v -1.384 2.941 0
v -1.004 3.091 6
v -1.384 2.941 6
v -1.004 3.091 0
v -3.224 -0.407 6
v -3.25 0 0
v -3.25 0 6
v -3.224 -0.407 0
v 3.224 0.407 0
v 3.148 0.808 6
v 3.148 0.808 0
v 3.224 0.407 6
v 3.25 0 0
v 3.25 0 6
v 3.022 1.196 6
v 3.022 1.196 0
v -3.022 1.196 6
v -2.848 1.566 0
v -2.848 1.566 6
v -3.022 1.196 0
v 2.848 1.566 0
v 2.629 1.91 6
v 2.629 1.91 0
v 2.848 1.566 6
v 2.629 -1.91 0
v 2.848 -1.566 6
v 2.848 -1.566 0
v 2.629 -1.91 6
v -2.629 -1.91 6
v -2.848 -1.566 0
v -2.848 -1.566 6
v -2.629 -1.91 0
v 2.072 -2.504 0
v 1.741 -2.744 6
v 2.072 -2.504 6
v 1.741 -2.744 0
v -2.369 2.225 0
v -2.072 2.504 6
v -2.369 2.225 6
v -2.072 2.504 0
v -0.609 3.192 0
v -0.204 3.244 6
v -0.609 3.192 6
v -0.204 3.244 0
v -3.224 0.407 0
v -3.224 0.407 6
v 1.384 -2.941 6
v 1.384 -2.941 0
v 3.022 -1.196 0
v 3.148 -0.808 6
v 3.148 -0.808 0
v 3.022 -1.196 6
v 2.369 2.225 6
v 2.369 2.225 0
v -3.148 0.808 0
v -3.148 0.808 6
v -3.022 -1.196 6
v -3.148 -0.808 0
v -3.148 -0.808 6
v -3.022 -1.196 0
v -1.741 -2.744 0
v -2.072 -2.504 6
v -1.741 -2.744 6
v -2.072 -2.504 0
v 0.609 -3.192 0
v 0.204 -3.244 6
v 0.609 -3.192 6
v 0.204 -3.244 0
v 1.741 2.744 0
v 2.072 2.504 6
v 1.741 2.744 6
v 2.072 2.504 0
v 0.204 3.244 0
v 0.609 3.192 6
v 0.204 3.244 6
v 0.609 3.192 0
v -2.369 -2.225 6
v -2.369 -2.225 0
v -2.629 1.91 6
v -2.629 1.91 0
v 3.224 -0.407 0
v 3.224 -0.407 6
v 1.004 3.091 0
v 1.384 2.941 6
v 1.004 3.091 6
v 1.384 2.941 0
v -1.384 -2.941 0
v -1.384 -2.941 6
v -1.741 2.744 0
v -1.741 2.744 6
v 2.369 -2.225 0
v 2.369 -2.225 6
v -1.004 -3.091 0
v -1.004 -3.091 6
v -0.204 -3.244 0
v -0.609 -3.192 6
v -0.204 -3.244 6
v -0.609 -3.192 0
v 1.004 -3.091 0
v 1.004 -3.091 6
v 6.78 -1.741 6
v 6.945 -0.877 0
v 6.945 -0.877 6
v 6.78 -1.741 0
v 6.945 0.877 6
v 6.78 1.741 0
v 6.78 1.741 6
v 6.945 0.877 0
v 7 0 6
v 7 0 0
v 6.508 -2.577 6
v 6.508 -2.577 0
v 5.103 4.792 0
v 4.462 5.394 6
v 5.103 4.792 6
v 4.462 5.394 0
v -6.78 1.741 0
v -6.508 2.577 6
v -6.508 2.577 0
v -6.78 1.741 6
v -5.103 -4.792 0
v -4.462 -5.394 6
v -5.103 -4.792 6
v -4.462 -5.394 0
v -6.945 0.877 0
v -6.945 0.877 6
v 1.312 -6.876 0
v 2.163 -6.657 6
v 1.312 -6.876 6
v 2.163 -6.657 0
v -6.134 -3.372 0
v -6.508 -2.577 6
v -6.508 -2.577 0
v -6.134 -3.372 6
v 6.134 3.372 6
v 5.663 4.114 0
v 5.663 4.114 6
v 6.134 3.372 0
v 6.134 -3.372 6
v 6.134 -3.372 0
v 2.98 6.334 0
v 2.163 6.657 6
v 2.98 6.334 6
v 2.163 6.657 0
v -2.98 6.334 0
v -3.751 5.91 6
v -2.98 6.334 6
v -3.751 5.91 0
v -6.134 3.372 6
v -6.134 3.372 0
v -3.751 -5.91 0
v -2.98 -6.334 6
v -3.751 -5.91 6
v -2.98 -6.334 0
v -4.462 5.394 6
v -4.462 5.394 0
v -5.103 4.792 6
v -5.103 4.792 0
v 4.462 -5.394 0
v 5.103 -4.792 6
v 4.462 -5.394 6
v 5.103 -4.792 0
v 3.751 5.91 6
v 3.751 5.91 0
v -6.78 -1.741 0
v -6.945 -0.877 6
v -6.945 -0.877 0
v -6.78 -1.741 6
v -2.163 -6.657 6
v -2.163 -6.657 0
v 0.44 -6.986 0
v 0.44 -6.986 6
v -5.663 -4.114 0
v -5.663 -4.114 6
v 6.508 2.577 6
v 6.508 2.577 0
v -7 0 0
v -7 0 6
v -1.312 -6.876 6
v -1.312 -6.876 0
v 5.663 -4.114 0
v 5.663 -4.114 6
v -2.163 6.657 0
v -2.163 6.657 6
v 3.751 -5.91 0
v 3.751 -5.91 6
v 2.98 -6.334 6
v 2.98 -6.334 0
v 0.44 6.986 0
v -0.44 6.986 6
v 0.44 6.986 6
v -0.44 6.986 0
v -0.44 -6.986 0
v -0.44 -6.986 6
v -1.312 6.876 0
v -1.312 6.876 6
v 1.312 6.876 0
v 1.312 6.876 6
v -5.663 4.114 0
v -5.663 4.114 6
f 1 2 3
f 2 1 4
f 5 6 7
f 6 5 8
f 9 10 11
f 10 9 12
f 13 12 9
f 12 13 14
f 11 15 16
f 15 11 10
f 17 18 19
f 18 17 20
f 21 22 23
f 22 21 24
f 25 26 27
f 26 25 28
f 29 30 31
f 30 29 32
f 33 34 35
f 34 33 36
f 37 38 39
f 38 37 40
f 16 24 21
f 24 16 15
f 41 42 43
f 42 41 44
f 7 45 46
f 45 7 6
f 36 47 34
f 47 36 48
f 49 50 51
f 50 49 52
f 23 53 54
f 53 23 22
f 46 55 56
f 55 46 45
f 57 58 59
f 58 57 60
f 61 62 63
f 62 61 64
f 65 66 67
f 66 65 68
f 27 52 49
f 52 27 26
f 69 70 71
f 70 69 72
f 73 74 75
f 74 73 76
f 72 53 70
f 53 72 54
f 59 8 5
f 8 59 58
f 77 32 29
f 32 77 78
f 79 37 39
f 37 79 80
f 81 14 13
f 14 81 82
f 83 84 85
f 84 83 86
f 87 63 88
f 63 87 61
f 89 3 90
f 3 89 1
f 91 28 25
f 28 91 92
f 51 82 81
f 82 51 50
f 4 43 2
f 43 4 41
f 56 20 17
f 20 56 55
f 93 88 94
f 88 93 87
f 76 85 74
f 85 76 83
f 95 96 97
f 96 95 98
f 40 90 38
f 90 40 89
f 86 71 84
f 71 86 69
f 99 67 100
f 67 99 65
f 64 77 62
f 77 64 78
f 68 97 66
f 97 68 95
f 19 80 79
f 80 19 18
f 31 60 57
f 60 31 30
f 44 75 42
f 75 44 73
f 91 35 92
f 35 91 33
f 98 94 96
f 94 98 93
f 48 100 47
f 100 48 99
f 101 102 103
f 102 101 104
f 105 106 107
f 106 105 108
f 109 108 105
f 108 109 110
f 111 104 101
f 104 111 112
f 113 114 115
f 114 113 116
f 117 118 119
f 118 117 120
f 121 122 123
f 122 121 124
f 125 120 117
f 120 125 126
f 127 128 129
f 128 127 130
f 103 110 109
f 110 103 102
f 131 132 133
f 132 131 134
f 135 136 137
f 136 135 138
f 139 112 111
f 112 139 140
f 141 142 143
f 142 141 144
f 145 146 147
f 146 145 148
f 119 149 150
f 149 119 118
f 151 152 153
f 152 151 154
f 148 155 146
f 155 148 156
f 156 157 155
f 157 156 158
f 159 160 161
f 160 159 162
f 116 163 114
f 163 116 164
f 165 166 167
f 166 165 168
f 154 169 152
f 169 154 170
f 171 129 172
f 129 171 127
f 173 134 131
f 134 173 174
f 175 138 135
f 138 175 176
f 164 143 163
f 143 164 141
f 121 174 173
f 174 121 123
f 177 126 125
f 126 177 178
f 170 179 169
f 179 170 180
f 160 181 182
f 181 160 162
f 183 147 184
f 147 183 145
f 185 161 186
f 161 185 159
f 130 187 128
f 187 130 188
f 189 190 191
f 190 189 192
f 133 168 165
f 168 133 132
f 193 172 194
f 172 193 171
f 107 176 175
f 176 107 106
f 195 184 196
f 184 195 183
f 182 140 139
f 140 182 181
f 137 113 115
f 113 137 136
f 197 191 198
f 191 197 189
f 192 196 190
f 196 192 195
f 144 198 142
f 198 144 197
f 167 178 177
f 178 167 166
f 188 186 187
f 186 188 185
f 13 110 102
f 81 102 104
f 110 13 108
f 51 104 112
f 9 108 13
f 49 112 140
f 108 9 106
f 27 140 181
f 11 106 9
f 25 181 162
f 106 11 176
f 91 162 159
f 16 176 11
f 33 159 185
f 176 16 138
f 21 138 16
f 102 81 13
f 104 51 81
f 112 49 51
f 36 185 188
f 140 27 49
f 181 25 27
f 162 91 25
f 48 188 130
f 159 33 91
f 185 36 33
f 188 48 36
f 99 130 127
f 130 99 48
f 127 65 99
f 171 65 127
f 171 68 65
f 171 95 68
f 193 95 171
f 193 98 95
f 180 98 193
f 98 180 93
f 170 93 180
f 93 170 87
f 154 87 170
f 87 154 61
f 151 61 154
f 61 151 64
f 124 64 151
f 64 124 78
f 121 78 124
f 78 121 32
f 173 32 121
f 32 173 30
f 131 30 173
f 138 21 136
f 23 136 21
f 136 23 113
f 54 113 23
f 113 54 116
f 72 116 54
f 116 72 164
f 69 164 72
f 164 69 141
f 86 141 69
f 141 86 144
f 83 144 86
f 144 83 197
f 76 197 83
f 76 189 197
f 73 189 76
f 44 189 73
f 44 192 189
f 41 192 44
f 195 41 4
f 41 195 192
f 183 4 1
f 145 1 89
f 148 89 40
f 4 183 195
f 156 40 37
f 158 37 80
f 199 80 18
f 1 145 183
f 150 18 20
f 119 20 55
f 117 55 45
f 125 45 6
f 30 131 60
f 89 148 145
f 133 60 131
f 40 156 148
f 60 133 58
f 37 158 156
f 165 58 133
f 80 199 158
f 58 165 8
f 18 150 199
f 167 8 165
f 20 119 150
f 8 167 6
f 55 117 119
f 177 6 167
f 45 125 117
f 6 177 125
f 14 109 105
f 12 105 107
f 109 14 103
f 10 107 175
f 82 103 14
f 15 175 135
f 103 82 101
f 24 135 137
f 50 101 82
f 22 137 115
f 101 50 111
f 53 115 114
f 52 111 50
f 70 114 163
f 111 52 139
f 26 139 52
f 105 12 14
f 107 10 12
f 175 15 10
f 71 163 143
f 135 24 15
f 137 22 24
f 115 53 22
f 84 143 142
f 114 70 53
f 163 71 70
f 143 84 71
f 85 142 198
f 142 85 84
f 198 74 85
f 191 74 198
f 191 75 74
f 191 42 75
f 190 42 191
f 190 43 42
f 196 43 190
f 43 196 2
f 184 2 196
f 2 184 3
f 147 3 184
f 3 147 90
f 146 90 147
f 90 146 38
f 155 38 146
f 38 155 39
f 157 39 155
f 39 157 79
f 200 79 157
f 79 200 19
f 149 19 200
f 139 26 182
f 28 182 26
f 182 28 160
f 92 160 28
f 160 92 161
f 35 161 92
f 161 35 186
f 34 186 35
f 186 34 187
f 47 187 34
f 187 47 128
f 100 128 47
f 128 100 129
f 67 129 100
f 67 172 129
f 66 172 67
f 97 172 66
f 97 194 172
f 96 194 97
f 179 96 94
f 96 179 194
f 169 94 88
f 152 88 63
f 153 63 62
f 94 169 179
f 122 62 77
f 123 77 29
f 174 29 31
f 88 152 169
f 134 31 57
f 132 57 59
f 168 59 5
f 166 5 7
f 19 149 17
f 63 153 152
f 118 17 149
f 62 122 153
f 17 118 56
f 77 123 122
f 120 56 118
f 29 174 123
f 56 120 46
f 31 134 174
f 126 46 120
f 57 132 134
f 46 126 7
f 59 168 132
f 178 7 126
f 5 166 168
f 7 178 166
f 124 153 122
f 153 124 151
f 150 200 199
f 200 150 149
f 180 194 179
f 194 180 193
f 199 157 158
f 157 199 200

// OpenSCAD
$fn = 50;

difference() {
	union() {
		cylinder(h = 6, r = 7.0);
	}
	union() {
		translate(v = [0.0, 0.0, -100.0]) {
			cylinder(h = 200, r = 3.25);
		}
		translate(v = [0.0, 0.0, -100.0]) {
			cylinder(h = 200, r = 1.8);
		}
		cylinder(h = 6, r = 2.5);
	}
}
